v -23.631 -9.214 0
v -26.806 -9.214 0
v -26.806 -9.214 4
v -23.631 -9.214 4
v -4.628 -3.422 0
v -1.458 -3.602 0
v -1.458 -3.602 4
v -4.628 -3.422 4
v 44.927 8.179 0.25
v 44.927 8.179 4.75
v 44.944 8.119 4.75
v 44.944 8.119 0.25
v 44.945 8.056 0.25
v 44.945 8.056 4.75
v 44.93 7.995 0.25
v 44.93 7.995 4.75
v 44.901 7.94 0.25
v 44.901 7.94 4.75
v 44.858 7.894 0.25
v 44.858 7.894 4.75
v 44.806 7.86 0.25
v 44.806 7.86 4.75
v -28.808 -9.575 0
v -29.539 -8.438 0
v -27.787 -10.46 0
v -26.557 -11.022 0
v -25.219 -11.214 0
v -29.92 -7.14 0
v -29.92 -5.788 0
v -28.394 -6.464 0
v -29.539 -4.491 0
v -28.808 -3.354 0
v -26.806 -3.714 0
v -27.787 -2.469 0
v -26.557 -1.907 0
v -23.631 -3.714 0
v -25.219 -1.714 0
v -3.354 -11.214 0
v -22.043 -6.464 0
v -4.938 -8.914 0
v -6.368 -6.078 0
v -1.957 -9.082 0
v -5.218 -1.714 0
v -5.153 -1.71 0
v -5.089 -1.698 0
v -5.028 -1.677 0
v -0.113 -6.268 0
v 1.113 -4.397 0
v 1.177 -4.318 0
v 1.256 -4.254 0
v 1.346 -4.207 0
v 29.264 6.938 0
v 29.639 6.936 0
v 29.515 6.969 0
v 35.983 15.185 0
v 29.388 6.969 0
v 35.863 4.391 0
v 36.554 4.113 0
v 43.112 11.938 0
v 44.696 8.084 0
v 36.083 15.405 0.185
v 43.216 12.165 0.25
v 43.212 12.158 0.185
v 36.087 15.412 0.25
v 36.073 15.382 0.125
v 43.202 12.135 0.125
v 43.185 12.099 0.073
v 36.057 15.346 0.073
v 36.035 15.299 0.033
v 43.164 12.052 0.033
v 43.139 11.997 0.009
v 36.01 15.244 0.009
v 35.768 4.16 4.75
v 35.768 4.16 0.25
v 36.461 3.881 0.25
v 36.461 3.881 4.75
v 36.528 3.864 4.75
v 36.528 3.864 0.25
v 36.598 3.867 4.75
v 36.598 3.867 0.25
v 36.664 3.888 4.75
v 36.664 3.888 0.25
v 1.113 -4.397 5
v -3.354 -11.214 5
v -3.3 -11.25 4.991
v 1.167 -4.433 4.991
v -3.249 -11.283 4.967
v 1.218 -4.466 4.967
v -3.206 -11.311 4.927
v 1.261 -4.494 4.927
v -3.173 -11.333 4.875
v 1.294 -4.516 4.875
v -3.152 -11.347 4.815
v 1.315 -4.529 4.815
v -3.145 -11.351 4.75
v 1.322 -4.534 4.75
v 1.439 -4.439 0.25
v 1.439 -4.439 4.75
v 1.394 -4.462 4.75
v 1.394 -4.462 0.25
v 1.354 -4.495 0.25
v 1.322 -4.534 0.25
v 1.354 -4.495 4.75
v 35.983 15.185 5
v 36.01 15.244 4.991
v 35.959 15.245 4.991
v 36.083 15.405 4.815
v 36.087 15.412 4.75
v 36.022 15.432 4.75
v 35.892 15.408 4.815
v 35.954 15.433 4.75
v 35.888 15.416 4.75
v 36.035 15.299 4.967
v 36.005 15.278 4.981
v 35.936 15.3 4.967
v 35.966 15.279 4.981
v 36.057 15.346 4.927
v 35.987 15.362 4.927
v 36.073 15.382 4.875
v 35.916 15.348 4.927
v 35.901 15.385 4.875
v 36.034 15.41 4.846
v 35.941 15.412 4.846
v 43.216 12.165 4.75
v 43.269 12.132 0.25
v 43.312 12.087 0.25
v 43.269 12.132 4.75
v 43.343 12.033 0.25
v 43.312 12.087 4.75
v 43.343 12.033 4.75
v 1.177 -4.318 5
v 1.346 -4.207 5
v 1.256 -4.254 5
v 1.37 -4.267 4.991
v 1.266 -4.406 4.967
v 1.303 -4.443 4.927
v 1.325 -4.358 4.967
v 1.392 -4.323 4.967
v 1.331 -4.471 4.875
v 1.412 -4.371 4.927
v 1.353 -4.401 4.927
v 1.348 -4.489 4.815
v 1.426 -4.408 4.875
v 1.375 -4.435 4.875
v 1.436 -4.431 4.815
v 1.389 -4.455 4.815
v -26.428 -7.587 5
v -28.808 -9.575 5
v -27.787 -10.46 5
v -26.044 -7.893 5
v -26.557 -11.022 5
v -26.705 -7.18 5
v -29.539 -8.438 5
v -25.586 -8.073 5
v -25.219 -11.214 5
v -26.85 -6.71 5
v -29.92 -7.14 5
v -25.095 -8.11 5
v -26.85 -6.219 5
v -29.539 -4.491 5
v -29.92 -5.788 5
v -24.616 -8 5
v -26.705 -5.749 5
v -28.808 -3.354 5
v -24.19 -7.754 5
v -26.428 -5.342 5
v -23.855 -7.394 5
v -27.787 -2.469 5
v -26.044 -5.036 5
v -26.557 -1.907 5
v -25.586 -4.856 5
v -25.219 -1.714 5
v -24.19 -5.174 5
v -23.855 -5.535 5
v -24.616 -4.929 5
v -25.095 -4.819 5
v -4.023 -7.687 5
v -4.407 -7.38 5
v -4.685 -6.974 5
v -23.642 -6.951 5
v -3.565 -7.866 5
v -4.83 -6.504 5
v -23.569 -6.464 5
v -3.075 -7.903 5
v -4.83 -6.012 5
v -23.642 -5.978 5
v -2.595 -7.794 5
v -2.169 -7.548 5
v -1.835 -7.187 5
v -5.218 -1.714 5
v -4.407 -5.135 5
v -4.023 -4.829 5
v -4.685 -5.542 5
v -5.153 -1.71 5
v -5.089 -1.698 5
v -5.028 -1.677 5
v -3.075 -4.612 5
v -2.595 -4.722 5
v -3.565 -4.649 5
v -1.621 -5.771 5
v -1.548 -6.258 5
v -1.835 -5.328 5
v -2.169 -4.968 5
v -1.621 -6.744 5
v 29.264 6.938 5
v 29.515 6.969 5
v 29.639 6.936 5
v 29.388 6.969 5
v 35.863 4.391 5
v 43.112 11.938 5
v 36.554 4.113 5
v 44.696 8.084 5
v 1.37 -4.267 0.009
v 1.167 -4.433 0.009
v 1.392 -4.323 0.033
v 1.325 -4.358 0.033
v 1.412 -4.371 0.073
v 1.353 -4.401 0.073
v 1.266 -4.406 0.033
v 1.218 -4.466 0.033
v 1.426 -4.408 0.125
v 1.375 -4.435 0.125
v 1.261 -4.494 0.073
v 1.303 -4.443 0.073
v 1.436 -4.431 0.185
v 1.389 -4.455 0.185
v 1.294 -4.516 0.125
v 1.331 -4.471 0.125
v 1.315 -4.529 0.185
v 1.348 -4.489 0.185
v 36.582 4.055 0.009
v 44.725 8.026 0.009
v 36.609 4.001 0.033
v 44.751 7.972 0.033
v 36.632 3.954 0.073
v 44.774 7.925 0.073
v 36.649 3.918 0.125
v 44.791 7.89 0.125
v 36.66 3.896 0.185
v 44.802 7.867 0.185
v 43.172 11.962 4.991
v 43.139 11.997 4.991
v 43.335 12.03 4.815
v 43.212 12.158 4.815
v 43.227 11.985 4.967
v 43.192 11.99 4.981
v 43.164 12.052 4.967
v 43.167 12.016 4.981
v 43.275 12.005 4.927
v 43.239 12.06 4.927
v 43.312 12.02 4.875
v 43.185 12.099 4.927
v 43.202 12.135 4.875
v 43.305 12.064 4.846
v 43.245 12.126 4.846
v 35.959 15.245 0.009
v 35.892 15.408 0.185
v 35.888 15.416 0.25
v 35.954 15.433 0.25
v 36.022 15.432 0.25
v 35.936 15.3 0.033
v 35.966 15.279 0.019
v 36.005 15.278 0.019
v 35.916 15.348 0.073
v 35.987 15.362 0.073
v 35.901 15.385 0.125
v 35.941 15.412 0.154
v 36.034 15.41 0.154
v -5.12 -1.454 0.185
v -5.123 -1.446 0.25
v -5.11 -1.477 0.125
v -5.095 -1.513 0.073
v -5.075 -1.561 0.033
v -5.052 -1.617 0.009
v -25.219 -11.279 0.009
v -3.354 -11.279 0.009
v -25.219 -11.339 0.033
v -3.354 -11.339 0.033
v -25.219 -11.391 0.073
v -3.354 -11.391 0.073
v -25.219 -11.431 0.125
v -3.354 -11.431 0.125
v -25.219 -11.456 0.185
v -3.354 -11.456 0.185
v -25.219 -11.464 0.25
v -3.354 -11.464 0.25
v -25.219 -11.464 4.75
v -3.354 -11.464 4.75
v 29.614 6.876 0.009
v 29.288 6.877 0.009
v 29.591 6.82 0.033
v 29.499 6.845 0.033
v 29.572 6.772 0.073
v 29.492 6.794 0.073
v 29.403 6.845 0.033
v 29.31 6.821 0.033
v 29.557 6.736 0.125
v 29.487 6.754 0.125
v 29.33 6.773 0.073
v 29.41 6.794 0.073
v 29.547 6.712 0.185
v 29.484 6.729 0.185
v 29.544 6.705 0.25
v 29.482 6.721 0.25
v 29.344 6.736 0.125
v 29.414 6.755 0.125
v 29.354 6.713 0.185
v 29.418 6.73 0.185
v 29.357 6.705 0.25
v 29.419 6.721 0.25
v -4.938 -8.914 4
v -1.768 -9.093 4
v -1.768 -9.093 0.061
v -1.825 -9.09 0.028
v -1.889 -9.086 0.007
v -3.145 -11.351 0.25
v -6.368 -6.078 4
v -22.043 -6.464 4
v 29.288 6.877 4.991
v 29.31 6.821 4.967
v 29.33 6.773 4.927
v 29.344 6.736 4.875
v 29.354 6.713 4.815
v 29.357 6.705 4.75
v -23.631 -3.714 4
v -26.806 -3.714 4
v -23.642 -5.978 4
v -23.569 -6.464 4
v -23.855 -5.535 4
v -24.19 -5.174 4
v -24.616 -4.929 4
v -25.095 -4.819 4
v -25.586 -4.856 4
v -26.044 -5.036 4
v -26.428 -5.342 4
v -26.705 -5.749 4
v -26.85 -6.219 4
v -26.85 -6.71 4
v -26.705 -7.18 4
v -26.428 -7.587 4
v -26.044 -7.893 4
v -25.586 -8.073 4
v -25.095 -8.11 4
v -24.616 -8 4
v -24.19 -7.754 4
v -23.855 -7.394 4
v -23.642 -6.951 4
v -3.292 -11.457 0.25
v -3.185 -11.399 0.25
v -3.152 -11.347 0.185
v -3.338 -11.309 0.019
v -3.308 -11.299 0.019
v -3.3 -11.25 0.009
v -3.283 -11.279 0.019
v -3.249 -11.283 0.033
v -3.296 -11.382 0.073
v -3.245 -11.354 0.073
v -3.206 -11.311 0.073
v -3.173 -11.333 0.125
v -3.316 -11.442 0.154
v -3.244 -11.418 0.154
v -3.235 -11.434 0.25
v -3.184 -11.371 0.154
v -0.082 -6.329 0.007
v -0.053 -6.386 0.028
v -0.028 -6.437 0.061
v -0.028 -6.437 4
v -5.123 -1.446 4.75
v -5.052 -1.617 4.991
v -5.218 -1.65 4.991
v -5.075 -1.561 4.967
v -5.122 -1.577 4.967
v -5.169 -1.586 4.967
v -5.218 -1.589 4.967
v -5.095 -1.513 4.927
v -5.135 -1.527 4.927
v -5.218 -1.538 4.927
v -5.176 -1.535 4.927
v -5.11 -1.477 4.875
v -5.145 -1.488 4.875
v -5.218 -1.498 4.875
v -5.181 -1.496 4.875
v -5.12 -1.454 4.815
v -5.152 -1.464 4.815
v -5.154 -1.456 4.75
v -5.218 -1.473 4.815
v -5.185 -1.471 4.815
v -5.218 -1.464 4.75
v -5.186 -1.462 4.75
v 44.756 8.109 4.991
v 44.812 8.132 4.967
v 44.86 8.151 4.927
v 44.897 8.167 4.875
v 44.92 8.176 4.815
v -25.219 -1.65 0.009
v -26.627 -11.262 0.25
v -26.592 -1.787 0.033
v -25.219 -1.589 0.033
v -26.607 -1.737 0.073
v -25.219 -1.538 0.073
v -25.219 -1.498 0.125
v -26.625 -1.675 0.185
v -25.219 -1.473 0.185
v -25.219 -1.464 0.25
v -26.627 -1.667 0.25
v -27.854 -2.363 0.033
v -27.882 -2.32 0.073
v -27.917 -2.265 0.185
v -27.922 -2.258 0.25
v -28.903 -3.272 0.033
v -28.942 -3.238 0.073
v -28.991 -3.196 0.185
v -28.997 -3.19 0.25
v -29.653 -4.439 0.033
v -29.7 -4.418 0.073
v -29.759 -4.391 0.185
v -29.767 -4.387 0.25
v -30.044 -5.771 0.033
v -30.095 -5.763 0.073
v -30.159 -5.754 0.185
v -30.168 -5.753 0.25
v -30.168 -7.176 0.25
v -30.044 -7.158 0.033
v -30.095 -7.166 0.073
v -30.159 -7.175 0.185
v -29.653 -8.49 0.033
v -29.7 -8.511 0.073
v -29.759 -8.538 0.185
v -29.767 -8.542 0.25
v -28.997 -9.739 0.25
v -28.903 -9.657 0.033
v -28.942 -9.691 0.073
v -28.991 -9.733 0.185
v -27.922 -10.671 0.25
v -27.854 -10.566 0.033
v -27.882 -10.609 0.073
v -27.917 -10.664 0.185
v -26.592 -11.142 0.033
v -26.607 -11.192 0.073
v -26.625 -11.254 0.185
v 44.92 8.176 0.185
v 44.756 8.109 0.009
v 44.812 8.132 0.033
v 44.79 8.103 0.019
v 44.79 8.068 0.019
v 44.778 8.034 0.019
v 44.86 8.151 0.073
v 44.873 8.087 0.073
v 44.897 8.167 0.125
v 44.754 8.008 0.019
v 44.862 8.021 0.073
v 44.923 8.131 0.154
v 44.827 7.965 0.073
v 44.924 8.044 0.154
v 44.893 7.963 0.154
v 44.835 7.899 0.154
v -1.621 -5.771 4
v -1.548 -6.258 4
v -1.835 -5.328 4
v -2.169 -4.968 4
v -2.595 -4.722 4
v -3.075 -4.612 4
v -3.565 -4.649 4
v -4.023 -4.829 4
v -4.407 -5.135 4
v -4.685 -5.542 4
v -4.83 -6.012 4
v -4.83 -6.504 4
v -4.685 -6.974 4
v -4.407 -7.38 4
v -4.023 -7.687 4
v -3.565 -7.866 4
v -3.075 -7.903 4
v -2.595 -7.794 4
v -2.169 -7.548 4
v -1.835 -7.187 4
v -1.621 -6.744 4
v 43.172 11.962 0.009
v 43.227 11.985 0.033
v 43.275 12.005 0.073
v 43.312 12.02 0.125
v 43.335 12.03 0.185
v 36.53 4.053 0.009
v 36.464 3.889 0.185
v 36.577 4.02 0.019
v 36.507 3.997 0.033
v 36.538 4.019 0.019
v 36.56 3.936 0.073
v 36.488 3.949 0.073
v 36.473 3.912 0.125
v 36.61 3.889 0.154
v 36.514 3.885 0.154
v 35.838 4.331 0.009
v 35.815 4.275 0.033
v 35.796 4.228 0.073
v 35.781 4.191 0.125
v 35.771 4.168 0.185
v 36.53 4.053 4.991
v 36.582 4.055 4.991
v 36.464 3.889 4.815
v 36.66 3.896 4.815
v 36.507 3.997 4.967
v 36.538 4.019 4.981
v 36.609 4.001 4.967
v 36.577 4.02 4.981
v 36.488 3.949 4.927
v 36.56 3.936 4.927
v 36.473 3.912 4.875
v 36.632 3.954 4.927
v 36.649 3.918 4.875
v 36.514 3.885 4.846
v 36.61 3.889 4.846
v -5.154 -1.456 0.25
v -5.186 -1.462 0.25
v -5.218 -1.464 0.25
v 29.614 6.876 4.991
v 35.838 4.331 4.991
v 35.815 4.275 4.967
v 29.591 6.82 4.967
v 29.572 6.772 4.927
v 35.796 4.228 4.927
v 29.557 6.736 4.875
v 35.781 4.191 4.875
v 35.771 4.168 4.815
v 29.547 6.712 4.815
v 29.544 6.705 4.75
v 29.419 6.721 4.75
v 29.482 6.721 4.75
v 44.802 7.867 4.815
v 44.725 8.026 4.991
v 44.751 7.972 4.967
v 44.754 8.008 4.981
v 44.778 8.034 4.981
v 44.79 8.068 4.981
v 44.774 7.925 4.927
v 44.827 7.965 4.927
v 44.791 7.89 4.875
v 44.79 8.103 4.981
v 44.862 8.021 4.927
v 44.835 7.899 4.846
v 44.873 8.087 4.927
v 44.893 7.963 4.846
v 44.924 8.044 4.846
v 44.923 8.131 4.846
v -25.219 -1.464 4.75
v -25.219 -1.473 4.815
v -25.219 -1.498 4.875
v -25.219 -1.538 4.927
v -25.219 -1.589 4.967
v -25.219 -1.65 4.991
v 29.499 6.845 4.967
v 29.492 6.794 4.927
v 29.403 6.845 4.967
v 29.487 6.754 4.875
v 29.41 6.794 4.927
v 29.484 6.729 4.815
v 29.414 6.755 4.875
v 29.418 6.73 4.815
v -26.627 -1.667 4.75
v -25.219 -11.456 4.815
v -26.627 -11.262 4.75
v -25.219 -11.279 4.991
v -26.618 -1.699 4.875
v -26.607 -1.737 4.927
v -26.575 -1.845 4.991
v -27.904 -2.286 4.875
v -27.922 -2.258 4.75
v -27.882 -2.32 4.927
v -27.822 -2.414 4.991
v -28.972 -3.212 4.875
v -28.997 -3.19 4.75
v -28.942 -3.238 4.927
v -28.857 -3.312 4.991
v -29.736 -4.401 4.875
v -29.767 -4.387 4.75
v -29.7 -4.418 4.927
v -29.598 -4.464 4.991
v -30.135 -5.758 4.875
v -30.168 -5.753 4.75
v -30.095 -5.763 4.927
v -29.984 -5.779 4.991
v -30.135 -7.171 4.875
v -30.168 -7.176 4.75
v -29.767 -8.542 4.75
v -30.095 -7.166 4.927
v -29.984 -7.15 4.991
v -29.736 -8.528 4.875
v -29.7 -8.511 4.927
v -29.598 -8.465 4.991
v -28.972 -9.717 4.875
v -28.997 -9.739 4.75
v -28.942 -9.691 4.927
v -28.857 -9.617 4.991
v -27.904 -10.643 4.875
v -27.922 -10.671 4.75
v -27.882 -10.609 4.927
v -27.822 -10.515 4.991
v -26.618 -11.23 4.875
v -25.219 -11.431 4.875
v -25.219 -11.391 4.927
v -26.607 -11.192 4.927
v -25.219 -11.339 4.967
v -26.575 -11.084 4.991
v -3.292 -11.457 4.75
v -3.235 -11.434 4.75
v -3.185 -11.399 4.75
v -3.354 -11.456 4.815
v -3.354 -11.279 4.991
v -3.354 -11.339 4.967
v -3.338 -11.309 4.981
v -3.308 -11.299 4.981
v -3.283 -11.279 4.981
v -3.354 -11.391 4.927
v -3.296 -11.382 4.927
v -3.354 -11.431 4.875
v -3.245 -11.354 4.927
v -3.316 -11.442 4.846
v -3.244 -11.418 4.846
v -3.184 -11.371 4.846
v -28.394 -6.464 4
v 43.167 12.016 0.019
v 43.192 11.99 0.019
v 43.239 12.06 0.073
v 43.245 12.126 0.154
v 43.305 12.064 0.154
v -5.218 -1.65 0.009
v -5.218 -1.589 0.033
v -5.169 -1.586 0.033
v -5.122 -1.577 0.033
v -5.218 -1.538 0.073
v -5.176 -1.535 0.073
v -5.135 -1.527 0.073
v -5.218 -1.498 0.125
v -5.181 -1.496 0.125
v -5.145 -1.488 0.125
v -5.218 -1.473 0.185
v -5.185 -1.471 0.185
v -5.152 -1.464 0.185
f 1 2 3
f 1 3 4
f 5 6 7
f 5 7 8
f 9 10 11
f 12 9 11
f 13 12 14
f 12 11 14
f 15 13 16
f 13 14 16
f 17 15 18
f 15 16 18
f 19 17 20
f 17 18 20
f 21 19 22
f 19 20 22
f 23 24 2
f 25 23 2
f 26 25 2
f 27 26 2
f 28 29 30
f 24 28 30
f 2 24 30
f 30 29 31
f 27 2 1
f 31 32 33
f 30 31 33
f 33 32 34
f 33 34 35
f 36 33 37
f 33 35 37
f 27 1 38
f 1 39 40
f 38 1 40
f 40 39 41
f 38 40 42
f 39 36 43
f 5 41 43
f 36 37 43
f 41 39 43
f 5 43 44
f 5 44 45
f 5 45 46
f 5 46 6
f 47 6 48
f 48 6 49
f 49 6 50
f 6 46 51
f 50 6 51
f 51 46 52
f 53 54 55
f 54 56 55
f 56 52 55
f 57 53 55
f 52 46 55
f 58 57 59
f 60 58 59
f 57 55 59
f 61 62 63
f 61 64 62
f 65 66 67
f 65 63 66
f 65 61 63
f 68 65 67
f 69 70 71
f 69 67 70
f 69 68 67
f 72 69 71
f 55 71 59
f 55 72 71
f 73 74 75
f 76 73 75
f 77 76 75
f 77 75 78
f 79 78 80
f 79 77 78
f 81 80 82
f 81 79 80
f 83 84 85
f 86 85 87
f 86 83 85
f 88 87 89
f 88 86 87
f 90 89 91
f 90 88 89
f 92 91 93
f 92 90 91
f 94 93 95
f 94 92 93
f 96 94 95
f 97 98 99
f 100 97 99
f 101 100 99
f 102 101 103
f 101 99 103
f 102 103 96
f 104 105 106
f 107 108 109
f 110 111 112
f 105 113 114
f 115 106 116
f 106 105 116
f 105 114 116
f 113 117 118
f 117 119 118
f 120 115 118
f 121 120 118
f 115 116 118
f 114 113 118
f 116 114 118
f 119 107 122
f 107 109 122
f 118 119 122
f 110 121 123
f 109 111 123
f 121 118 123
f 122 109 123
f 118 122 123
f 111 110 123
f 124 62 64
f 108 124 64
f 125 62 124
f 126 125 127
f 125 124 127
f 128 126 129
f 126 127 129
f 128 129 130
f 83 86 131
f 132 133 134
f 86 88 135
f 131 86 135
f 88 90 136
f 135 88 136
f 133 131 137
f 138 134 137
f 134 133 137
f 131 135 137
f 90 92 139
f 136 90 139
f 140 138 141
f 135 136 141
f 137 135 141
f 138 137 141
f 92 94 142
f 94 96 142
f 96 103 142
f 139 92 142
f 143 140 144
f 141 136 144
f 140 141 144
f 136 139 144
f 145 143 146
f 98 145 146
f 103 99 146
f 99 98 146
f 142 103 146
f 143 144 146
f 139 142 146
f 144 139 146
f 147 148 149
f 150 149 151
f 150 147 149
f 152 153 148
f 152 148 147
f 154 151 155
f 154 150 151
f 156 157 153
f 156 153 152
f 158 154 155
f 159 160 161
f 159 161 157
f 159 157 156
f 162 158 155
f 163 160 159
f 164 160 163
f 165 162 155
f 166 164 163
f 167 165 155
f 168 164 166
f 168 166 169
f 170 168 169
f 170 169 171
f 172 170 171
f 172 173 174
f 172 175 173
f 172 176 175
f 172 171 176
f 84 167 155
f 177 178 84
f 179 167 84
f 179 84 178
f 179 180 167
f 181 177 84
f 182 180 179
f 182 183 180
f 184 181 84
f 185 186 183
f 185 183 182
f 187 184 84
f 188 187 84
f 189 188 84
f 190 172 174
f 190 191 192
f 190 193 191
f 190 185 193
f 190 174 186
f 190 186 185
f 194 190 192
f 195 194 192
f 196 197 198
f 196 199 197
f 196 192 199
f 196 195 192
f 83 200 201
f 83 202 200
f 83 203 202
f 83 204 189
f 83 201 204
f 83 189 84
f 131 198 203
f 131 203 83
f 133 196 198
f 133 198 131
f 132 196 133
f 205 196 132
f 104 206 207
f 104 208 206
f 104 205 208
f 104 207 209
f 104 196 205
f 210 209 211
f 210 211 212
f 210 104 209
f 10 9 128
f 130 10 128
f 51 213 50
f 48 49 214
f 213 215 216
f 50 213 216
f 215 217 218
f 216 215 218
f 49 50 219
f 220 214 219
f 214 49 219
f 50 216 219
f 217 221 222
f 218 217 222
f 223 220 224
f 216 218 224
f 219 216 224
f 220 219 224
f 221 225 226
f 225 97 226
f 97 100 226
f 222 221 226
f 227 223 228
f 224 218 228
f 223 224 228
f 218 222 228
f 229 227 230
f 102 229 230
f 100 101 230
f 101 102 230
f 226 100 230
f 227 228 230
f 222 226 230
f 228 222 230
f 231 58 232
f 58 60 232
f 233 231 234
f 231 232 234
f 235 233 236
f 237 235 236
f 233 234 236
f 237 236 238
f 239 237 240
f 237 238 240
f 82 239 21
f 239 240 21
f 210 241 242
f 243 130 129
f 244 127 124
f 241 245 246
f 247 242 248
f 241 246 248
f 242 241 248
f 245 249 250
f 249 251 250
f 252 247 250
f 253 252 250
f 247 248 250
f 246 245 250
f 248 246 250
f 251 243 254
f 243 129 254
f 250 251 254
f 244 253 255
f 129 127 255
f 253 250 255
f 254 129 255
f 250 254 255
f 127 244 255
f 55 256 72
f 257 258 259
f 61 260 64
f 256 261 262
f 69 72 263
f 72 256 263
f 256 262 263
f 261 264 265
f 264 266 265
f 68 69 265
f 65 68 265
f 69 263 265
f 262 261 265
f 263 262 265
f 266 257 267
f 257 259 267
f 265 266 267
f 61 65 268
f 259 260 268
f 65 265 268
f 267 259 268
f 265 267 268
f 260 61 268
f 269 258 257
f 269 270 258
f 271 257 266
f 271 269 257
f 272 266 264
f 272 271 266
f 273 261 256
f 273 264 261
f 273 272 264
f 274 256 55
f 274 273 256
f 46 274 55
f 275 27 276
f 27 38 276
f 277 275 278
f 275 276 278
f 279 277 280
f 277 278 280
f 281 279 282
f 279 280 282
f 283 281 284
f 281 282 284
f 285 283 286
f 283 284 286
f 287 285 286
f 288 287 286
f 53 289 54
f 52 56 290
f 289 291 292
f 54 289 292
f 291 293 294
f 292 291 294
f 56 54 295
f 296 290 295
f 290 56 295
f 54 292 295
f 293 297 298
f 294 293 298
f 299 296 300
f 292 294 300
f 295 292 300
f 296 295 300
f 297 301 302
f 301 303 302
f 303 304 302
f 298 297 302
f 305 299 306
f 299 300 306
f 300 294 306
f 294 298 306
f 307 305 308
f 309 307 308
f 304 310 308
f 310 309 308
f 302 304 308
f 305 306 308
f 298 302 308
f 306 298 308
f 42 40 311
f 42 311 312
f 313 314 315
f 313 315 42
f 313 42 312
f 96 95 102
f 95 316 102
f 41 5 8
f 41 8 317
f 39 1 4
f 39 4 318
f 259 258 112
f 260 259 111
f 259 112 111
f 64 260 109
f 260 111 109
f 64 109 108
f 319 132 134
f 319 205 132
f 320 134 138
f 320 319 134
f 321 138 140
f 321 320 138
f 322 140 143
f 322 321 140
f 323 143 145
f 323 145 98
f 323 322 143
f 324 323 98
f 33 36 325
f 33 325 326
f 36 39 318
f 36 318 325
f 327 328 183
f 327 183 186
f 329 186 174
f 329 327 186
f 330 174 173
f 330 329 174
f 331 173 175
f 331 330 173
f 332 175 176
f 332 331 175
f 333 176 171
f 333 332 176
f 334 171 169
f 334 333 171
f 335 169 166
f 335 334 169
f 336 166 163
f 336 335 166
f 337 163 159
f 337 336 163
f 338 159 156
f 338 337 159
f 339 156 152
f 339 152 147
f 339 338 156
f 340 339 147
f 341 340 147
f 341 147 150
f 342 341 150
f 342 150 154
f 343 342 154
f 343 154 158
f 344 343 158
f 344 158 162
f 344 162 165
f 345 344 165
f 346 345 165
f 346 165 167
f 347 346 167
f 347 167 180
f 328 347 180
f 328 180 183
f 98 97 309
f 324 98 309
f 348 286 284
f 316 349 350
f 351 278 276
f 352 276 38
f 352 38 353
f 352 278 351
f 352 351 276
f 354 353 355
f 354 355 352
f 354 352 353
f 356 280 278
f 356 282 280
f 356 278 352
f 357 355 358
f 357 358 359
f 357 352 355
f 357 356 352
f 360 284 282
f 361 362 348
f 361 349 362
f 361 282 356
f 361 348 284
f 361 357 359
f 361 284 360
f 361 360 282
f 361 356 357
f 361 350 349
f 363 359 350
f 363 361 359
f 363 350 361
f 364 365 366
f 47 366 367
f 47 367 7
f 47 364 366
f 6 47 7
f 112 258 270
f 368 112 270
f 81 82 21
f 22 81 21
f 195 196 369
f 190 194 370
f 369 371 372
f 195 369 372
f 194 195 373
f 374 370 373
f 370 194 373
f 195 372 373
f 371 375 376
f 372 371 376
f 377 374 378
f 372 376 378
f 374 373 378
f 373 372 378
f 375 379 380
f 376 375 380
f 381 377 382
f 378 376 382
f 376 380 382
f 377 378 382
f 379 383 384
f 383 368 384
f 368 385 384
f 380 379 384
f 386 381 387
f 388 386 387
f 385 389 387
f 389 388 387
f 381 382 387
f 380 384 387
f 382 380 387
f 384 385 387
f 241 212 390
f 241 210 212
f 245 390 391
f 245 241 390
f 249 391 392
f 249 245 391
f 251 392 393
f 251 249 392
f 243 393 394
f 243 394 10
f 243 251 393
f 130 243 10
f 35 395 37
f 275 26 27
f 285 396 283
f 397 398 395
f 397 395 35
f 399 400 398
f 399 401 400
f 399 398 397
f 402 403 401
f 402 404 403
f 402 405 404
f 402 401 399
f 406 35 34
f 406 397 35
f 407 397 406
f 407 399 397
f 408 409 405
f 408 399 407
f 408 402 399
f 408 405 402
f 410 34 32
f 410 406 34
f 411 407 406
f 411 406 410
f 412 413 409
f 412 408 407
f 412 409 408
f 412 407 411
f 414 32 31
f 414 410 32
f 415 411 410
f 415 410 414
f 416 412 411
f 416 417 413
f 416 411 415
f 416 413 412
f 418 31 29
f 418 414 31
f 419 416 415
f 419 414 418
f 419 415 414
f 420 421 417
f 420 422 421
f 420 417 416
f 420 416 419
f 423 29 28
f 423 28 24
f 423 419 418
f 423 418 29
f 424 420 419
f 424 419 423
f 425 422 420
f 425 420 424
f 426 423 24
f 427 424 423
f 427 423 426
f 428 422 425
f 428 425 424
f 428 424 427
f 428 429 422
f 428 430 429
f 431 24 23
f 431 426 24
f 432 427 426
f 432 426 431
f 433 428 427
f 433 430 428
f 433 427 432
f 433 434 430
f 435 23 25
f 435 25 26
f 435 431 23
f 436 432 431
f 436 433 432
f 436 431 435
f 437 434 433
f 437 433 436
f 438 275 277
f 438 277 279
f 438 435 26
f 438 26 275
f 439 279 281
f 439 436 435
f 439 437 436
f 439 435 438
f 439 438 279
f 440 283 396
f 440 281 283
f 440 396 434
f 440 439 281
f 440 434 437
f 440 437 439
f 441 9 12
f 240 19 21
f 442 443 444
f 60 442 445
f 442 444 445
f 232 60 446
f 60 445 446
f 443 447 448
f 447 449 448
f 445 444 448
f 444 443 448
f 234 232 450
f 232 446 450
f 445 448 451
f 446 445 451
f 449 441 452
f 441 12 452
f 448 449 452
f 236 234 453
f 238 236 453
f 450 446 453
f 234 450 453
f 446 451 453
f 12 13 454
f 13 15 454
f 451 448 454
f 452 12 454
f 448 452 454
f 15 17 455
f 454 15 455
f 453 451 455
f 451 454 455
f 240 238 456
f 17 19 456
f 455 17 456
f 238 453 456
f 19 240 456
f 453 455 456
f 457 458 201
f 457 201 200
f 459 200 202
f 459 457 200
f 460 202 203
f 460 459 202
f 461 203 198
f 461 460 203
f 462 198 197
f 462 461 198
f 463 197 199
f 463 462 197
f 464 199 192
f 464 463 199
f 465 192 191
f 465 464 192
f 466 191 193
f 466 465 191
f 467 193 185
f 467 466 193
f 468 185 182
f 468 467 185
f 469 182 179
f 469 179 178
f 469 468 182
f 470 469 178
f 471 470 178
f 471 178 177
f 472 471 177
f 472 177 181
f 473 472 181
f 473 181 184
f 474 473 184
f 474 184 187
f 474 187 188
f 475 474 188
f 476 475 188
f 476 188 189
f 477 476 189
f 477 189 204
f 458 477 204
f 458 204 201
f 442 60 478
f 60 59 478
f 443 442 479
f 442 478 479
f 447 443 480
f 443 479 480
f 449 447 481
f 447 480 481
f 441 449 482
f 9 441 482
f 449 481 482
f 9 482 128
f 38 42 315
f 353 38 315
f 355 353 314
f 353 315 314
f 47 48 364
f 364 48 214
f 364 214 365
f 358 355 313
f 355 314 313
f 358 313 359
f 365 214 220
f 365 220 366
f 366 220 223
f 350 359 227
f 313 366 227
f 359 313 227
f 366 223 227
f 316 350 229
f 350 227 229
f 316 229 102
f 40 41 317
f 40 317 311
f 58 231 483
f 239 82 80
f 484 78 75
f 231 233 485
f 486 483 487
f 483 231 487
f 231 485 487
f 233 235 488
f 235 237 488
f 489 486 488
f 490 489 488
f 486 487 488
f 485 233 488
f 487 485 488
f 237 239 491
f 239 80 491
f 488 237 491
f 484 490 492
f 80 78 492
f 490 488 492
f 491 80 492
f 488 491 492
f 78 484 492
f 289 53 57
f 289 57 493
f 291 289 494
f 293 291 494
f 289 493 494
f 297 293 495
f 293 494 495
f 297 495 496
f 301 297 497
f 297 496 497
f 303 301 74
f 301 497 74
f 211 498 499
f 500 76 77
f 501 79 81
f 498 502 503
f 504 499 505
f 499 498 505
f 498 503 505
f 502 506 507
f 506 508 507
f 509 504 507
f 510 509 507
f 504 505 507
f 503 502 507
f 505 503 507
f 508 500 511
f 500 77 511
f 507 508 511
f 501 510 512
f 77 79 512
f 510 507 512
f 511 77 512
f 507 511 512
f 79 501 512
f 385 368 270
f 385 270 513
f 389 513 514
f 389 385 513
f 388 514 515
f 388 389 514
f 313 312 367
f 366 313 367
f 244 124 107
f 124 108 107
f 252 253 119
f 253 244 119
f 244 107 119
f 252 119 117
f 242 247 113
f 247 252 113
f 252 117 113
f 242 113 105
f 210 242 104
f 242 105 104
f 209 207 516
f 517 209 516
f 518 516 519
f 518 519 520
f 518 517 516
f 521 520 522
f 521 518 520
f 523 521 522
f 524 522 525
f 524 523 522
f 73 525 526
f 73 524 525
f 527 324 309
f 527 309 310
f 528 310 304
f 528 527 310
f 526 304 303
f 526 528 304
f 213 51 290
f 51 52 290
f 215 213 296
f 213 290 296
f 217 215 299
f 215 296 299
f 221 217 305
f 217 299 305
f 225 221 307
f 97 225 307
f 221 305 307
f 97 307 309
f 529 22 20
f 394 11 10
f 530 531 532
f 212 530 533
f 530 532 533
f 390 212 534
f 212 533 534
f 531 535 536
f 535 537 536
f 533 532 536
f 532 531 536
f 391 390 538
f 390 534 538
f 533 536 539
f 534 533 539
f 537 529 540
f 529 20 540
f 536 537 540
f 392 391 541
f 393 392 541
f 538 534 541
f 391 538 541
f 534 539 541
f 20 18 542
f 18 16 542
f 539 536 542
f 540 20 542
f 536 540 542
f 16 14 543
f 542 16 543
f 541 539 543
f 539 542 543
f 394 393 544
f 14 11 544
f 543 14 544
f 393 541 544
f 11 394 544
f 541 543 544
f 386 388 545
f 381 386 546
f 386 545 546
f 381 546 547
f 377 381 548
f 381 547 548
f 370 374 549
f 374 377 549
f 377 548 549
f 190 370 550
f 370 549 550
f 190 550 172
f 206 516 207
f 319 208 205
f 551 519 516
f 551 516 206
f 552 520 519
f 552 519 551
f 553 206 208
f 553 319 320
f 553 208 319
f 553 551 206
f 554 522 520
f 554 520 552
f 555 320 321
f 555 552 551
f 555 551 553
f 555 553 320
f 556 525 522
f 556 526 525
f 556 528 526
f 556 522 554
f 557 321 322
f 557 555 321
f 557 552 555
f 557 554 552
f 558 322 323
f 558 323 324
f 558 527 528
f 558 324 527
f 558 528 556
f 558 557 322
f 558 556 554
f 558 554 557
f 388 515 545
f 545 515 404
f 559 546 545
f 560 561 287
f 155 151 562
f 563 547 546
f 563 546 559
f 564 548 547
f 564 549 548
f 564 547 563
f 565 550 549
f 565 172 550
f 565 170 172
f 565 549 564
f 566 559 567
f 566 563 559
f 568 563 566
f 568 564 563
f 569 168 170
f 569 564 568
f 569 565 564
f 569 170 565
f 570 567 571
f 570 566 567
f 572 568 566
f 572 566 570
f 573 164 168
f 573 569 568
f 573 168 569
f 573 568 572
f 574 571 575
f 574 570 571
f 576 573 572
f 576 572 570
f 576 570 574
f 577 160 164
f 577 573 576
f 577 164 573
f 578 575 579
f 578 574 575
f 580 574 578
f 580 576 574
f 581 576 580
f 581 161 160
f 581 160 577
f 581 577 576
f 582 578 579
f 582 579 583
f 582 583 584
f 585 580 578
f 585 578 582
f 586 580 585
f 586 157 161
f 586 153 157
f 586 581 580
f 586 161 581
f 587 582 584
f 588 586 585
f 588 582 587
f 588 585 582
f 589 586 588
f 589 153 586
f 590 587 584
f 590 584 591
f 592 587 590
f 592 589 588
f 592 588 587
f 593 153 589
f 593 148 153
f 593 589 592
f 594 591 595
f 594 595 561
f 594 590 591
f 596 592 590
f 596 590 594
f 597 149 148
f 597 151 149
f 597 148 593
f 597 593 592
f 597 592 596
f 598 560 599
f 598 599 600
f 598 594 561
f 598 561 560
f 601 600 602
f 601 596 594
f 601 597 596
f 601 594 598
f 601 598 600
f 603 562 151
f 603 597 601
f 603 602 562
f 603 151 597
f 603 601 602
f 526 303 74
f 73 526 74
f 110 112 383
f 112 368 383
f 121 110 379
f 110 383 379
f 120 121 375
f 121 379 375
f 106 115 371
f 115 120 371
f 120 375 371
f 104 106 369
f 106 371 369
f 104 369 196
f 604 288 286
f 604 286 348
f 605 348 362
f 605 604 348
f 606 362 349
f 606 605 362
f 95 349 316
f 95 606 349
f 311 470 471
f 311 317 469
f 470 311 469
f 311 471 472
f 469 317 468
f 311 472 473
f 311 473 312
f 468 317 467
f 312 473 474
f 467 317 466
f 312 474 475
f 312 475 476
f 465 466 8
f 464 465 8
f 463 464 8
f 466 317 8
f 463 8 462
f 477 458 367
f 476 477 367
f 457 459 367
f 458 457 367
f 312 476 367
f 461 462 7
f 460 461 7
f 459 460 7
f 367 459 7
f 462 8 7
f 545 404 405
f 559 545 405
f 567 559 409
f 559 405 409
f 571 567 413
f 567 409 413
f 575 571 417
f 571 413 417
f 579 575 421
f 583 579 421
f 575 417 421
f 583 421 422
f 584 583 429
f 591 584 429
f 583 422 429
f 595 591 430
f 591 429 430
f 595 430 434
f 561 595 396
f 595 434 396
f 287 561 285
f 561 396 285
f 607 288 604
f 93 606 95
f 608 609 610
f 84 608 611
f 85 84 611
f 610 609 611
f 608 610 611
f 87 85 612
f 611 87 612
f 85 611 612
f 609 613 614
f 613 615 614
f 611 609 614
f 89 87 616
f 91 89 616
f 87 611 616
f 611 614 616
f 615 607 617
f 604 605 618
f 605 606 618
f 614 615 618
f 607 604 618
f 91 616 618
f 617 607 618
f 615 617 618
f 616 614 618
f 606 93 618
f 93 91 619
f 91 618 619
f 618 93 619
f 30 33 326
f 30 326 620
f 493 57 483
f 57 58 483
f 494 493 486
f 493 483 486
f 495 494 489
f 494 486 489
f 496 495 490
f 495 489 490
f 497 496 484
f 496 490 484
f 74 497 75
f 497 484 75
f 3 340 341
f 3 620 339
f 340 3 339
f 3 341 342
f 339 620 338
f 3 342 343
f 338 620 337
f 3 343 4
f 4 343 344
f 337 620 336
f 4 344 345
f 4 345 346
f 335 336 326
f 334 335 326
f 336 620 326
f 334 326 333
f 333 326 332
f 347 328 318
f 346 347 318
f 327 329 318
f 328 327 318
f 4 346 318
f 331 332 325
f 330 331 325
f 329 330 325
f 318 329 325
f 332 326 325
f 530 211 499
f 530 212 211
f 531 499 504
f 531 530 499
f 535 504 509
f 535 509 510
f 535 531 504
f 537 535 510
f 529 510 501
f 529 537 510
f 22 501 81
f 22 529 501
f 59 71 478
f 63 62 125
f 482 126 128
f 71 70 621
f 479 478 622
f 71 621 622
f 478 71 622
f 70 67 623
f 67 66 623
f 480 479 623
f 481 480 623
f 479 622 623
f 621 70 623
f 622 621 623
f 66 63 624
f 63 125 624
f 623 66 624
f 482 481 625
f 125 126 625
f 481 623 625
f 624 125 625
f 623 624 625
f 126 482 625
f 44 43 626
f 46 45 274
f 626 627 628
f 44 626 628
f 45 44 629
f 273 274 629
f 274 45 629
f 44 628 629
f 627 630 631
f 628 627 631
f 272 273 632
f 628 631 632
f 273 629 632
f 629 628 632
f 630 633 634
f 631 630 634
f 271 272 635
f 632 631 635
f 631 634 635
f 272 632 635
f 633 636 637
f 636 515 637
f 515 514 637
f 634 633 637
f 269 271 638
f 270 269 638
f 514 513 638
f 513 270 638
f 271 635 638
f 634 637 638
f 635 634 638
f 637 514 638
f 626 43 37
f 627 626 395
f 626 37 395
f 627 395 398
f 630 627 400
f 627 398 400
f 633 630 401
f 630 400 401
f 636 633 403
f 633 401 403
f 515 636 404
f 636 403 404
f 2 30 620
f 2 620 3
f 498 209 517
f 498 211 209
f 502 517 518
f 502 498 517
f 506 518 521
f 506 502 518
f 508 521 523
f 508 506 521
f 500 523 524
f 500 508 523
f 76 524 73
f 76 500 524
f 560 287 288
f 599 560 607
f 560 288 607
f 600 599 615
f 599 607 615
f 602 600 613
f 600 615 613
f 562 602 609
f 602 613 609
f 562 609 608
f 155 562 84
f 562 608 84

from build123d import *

# Parameters (mm, degrees)
SKETCH1_R           = 1.65
BOSS_EXTRUDE1_DEPTH = 5
FILLET2_R           = 0.25
CUT_EXTRUDE1_DEPTH  = 4


with BuildPart() as part:
    # Sketch1 → Boss-Extrude1 (new body)
    # profile 1 of 2: a face of its own
    with BuildSketch(Plane.XY):
        with BuildLine():
            Line((-5.168635154, -1.464478016), (-25.218635154, -1.464478016))
            ThreePointArc((-25.218635154, -1.464478016), (-30.218635154, -6.464478016), (-25.218635154, -11.464478016))
            Line((-25.218635154, -11.464478016), (-3.218635154, -11.464478016))
            Line((-3.218635154, -11.464478016), (1.36555506, -4.468181425))
            ThreePointArc((1.36555506, -4.468181425), (-0.47833252, -2.282284635), (-3.218635154, -1.464478016))
            Line((-3.218635154, -1.464478016), (-5.168635154, -1.464478016))
        make_face()
        with Locations((-25.218635154, -6.464478016)):
            Circle(SKETCH1_R, mode=Mode.SUBTRACT)
        with Locations((-3.197929879, -6.257635448)):
            Circle(SKETCH1_R, mode=Mode.SUBTRACT)
    # profile 2 of 2: a face of its own
    with BuildSketch(Plane.XY):
        with BuildLine():
            Line((35.988446, 15.45724385), (-5.168635154, -1.464478016))
            Line((-5.168635154, -1.464478016), (-3.218635154, -1.464478016))
            ThreePointArc((-3.218635154, -1.464478016), (-0.47833252, -2.282284635), (1.36555506, -4.468181425))
            Line((1.36555506, -4.468181425), (29.450627286, 6.742809526))
            Line((29.450627286, 6.742809526), (35.767904523, 4.15974363))
            Line((35.767904523, 4.15974363), (36.563833051, 3.839605387))
            Line((36.563833051, 3.839605387), (45.016686804, 7.962377757))
            Line((45.016686804, 7.962377757), (43.305501447, 12.124329784))
            Line((43.305501447, 12.124329784), (35.988446, 15.45724385))
        make_face()
    extrude(amount=BOSS_EXTRUDE1_DEPTH)

    # Fillet2
    fillet2_edges = [part.edges().sort_by_distance(p)[0] for p in [
        (-14.218635154, -11.464478016, 0),
        (-30.218635154, -6.464478016, 0),
        (-15.193635154, -1.464478016, 0),
        (15.409905423, 6.996382917, 0),
        (-0.926540047, -7.966329721, 5),
        (39.646973723, 13.790786817, 0),
        (44.161094126, 10.04335377, 0),
        (40.790259928, 5.900991572, 0),
        (36.165868787, 3.999674508, 0),
        (32.609265904, 5.451276578, 0),
        (15.408091173, 1.137314051, 0),
        (-0.926540047, -7.966329721, 0),
        (15.408091173, 1.137314051, 5),
        (-3.218635154, -11.464478016, 2.5),
        (-5.168635154, -1.464478016, 2.5),
        (35.988446, 15.45724385, 2.5),
        (43.305501447, 12.124329784, 2.5),
        (45.016686804, 7.962377757, 2.5),
        (36.563833051, 3.839605387, 2.5),
        (35.767904523, 4.15974363, 2.5),
        (29.450627286, 6.742809526, 2.5),
        (1.36555506, -4.468181425, 2.5),
        (32.609265904, 5.451276578, 5),
        (36.165868787, 3.999674508, 5),
        (40.790259928, 5.900991572, 5),
        (44.161094126, 10.04335377, 5),
        (39.646973723, 13.790786817, 5),
        (15.409905423, 6.996382917, 5),
        (-15.193635154, -1.464478016, 5),
        (-30.218635154, -6.464478016, 5),
        (-14.218635154, -11.464478016, 5),
    ]]
    fillet(fillet2_edges, radius=FILLET2_R)

    # Sketch2 → Cut-Extrude1 (cut)
    with BuildSketch(Plane.XY):
        Polygon((-23.630921913, -9.214478016), (-22.043208673, -6.464478016), (-23.630921913, -3.714478016), (-26.806348394, -3.714478016), (-28.394061634, -6.464478016), (-26.806348394, -9.214478016), align=None)
        Polygon((-0.027560565, -6.436777135), (-1.45760397, -3.601585926), (-4.627973284, -3.422444239), (-6.368299193, -6.078493761), (-4.938255788, -8.91368497), (-1.767886474, -9.092826657), align=None)
    extrude(amount=CUT_EXTRUDE1_DEPTH, mode=Mode.SUBTRACT)


solid = part.part
